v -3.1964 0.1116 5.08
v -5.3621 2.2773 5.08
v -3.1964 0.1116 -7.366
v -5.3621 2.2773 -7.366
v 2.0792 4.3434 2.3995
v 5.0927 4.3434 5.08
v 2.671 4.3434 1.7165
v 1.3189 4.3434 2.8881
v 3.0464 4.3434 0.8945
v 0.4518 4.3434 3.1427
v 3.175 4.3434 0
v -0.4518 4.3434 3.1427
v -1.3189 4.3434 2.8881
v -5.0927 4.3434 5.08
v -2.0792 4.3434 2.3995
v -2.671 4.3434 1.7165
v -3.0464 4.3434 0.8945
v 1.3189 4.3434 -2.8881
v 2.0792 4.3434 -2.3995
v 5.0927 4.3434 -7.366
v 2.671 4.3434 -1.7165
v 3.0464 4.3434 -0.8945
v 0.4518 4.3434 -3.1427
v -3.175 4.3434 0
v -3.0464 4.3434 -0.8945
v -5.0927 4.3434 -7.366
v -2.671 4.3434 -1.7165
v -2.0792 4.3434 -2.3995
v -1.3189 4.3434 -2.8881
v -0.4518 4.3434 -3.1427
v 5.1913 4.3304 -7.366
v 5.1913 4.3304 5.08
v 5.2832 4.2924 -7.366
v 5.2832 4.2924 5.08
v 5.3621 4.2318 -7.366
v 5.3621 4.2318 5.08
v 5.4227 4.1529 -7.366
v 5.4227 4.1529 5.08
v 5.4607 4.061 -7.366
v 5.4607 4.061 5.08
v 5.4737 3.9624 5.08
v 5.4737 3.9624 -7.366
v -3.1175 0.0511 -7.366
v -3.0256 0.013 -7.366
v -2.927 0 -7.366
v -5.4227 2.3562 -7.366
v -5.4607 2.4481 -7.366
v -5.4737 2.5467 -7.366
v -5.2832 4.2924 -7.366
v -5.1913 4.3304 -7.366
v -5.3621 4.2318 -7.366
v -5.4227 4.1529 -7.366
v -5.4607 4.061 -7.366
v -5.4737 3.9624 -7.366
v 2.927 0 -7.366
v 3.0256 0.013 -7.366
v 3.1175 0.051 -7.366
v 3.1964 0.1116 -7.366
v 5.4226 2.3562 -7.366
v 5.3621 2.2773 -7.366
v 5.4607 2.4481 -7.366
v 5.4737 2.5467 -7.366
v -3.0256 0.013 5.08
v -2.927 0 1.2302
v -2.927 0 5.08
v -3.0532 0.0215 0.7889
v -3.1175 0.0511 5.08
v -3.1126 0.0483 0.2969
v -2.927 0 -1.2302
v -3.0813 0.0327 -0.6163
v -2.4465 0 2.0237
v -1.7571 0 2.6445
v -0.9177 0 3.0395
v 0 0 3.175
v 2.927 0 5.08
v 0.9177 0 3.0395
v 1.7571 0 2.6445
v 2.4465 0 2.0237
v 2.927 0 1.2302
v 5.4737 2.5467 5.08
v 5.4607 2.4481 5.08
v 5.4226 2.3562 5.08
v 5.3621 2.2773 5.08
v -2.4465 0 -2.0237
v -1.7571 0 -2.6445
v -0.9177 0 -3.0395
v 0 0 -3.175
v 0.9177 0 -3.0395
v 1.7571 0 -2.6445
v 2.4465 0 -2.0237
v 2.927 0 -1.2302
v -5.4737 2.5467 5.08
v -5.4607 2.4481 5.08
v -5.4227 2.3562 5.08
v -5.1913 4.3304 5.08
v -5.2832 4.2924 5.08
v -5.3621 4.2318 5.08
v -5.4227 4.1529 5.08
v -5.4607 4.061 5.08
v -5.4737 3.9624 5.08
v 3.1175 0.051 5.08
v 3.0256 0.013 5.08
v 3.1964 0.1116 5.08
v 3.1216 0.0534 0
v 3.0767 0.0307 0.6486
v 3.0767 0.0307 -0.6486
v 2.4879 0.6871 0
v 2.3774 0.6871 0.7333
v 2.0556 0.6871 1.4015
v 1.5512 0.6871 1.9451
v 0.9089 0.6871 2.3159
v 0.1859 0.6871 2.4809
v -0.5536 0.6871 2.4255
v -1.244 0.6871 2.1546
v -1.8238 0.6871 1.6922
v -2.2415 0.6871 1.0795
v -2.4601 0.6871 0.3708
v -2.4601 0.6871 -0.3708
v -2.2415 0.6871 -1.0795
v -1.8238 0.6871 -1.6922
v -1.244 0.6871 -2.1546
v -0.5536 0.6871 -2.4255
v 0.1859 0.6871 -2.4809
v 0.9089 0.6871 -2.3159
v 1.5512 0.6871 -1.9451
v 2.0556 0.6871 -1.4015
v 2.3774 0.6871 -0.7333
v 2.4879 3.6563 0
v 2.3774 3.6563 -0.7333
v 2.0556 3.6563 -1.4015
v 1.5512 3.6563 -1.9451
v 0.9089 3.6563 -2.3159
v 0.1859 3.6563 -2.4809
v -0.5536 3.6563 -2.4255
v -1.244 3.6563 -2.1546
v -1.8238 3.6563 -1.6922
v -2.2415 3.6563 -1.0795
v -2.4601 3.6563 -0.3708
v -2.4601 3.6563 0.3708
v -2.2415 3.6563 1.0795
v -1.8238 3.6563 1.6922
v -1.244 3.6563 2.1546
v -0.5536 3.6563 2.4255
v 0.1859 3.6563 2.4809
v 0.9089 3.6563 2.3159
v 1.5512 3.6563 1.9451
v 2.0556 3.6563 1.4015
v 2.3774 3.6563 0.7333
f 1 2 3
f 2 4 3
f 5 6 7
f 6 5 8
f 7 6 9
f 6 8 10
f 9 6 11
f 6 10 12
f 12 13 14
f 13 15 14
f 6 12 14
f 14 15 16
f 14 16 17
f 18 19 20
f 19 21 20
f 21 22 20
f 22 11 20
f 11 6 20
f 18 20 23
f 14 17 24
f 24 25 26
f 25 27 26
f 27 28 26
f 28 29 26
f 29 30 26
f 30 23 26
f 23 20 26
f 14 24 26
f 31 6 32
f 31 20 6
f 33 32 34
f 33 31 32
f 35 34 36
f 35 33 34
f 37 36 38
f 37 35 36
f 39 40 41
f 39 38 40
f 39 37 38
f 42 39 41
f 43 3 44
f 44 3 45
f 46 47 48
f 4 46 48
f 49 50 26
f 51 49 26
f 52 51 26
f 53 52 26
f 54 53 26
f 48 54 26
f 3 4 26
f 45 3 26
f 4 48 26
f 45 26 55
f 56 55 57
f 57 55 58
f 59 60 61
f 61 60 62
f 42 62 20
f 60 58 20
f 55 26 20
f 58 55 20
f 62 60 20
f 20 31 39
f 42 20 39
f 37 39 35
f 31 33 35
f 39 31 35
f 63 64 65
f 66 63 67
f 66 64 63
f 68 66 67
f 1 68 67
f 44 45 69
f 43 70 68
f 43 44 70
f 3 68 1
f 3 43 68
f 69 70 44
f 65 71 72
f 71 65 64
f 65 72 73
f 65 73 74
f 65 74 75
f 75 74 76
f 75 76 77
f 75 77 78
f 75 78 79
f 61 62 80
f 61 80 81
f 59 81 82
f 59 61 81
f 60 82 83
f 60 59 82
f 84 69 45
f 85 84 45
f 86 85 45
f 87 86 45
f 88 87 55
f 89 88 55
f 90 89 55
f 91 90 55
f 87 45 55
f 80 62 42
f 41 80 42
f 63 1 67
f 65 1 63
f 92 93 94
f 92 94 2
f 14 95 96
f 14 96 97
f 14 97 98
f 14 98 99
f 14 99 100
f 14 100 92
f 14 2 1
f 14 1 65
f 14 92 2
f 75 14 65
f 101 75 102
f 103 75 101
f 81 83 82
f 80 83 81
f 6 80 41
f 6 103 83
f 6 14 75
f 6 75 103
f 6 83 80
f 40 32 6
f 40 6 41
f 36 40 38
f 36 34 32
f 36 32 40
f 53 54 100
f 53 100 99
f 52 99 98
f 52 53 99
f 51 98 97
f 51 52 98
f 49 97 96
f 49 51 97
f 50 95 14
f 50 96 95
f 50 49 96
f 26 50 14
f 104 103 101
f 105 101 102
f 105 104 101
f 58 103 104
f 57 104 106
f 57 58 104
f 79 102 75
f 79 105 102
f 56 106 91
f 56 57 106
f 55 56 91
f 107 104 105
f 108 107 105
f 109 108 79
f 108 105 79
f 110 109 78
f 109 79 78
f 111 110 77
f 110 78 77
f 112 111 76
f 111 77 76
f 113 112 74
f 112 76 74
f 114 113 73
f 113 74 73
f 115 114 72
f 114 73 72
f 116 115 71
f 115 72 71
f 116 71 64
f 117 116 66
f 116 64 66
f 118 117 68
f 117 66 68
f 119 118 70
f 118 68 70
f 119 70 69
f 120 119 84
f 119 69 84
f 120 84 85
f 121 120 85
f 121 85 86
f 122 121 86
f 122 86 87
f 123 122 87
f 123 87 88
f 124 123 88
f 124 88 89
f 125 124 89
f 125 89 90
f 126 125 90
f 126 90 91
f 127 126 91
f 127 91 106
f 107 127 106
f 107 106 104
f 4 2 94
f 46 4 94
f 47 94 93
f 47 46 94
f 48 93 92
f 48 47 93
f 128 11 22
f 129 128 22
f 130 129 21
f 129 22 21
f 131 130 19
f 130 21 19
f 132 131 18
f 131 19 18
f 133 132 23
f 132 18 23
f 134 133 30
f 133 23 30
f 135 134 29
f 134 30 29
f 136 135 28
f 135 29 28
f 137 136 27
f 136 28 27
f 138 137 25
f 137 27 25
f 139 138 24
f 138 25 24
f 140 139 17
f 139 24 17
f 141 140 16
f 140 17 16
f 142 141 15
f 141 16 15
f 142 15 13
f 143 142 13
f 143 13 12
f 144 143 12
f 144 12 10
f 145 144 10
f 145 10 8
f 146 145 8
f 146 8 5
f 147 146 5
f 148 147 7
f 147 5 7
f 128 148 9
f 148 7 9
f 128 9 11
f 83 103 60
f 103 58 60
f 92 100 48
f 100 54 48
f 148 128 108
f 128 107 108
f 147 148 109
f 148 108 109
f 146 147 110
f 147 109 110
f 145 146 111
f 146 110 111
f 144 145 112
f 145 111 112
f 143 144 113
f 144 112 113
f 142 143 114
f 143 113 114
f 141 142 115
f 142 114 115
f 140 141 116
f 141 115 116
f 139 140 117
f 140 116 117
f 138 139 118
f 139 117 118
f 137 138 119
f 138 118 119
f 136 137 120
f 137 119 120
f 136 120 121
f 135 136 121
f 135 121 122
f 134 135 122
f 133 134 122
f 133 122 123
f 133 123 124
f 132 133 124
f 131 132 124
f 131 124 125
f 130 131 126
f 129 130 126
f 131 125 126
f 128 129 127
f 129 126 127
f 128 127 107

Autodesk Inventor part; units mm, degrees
sketch "Sketch_1" plane through (0, 0, -7.366) normal (0, 0, 1) x (1, 0, 0)
  line L0 (-5.4737, 3.9624) -> (-5.4737, 2.5467)
  arc A0 (-5.4737, 2.5467) -> (-5.3621, 2.2773) centre (-5.0927, 2.5467) ccw
  line L1 (-5.3621, 2.2773) -> (-3.1964, 0.1116)
  arc A1 (-3.1964, 0.1116) -> (-2.927, 0) centre (-2.927, 0.381) ccw
  line L2 (-2.927, 0) -> (2.927, 0)
  arc A2 (2.927, 0) -> (3.1964, 0.1116) centre (2.927, 0.381) ccw
  line L3 (3.1964, 0.1116) -> (5.3621, 2.2773)
  arc A3 (5.3621, 2.2773) -> (5.4737, 2.5467) centre (5.0927, 2.5467) ccw
  line L4 (5.4737, 2.5467) -> (5.4737, 3.9624)
  arc A4 (5.4737, 3.9624) -> (5.0927, 4.3434) centre (5.0927, 3.9624) ccw
  line L5 (5.0927, 4.3434) -> (-5.0927, 4.3434)
  arc A5 (-5.0927, 4.3434) -> (-5.4737, 3.9624) centre (-5.0927, 3.9624) ccw
extrude "Extrusion1" add sketch "Sketch_1" along normal blind 12.446
sketch "Sketch_3" plane through (0, 0, 0) normal (0, 0, 1) x (1, 0, 0)
  line L0 (0, 0) -> (0, 4.3434)
  line L1 (0, 4.3434) -> (3.175, 4.3434)
  line L2 (3.175, 4.3434) -> (2.4879, 3.6563)
  line L3 (2.4879, 3.6563) -> (2.4879, 0.6871)
  line L4 (2.4879, 0.6871) -> (3.175, 0)
  line L5 (3.175, 0) -> (0, 0)
  line L6 (0, 0) -> (0, 4.3434)
revolve "Revolution1" cut sketch "Sketch_3" angle 360 about axis through (0, 0, 0) along (0, -1, 0)
thread "Thread1" size "1/4-20 UNC" class "2B" standard "ANSI Unified Screw Threads" full length
ref_plane "tnut_XY" through (0, 4.3434, 0) normal (0, 1, 0) x (1, 0, 0)
ref_plane "tnut_YZ" through (0, 4.3434, 0) normal (1, 0, 0) x (0, 0, -1)
ref_plane "tnut_ZX" through (0, 4.3434, 0) normal (0, 0, -1) x (0, 1, 0)
properties part number "3204"
